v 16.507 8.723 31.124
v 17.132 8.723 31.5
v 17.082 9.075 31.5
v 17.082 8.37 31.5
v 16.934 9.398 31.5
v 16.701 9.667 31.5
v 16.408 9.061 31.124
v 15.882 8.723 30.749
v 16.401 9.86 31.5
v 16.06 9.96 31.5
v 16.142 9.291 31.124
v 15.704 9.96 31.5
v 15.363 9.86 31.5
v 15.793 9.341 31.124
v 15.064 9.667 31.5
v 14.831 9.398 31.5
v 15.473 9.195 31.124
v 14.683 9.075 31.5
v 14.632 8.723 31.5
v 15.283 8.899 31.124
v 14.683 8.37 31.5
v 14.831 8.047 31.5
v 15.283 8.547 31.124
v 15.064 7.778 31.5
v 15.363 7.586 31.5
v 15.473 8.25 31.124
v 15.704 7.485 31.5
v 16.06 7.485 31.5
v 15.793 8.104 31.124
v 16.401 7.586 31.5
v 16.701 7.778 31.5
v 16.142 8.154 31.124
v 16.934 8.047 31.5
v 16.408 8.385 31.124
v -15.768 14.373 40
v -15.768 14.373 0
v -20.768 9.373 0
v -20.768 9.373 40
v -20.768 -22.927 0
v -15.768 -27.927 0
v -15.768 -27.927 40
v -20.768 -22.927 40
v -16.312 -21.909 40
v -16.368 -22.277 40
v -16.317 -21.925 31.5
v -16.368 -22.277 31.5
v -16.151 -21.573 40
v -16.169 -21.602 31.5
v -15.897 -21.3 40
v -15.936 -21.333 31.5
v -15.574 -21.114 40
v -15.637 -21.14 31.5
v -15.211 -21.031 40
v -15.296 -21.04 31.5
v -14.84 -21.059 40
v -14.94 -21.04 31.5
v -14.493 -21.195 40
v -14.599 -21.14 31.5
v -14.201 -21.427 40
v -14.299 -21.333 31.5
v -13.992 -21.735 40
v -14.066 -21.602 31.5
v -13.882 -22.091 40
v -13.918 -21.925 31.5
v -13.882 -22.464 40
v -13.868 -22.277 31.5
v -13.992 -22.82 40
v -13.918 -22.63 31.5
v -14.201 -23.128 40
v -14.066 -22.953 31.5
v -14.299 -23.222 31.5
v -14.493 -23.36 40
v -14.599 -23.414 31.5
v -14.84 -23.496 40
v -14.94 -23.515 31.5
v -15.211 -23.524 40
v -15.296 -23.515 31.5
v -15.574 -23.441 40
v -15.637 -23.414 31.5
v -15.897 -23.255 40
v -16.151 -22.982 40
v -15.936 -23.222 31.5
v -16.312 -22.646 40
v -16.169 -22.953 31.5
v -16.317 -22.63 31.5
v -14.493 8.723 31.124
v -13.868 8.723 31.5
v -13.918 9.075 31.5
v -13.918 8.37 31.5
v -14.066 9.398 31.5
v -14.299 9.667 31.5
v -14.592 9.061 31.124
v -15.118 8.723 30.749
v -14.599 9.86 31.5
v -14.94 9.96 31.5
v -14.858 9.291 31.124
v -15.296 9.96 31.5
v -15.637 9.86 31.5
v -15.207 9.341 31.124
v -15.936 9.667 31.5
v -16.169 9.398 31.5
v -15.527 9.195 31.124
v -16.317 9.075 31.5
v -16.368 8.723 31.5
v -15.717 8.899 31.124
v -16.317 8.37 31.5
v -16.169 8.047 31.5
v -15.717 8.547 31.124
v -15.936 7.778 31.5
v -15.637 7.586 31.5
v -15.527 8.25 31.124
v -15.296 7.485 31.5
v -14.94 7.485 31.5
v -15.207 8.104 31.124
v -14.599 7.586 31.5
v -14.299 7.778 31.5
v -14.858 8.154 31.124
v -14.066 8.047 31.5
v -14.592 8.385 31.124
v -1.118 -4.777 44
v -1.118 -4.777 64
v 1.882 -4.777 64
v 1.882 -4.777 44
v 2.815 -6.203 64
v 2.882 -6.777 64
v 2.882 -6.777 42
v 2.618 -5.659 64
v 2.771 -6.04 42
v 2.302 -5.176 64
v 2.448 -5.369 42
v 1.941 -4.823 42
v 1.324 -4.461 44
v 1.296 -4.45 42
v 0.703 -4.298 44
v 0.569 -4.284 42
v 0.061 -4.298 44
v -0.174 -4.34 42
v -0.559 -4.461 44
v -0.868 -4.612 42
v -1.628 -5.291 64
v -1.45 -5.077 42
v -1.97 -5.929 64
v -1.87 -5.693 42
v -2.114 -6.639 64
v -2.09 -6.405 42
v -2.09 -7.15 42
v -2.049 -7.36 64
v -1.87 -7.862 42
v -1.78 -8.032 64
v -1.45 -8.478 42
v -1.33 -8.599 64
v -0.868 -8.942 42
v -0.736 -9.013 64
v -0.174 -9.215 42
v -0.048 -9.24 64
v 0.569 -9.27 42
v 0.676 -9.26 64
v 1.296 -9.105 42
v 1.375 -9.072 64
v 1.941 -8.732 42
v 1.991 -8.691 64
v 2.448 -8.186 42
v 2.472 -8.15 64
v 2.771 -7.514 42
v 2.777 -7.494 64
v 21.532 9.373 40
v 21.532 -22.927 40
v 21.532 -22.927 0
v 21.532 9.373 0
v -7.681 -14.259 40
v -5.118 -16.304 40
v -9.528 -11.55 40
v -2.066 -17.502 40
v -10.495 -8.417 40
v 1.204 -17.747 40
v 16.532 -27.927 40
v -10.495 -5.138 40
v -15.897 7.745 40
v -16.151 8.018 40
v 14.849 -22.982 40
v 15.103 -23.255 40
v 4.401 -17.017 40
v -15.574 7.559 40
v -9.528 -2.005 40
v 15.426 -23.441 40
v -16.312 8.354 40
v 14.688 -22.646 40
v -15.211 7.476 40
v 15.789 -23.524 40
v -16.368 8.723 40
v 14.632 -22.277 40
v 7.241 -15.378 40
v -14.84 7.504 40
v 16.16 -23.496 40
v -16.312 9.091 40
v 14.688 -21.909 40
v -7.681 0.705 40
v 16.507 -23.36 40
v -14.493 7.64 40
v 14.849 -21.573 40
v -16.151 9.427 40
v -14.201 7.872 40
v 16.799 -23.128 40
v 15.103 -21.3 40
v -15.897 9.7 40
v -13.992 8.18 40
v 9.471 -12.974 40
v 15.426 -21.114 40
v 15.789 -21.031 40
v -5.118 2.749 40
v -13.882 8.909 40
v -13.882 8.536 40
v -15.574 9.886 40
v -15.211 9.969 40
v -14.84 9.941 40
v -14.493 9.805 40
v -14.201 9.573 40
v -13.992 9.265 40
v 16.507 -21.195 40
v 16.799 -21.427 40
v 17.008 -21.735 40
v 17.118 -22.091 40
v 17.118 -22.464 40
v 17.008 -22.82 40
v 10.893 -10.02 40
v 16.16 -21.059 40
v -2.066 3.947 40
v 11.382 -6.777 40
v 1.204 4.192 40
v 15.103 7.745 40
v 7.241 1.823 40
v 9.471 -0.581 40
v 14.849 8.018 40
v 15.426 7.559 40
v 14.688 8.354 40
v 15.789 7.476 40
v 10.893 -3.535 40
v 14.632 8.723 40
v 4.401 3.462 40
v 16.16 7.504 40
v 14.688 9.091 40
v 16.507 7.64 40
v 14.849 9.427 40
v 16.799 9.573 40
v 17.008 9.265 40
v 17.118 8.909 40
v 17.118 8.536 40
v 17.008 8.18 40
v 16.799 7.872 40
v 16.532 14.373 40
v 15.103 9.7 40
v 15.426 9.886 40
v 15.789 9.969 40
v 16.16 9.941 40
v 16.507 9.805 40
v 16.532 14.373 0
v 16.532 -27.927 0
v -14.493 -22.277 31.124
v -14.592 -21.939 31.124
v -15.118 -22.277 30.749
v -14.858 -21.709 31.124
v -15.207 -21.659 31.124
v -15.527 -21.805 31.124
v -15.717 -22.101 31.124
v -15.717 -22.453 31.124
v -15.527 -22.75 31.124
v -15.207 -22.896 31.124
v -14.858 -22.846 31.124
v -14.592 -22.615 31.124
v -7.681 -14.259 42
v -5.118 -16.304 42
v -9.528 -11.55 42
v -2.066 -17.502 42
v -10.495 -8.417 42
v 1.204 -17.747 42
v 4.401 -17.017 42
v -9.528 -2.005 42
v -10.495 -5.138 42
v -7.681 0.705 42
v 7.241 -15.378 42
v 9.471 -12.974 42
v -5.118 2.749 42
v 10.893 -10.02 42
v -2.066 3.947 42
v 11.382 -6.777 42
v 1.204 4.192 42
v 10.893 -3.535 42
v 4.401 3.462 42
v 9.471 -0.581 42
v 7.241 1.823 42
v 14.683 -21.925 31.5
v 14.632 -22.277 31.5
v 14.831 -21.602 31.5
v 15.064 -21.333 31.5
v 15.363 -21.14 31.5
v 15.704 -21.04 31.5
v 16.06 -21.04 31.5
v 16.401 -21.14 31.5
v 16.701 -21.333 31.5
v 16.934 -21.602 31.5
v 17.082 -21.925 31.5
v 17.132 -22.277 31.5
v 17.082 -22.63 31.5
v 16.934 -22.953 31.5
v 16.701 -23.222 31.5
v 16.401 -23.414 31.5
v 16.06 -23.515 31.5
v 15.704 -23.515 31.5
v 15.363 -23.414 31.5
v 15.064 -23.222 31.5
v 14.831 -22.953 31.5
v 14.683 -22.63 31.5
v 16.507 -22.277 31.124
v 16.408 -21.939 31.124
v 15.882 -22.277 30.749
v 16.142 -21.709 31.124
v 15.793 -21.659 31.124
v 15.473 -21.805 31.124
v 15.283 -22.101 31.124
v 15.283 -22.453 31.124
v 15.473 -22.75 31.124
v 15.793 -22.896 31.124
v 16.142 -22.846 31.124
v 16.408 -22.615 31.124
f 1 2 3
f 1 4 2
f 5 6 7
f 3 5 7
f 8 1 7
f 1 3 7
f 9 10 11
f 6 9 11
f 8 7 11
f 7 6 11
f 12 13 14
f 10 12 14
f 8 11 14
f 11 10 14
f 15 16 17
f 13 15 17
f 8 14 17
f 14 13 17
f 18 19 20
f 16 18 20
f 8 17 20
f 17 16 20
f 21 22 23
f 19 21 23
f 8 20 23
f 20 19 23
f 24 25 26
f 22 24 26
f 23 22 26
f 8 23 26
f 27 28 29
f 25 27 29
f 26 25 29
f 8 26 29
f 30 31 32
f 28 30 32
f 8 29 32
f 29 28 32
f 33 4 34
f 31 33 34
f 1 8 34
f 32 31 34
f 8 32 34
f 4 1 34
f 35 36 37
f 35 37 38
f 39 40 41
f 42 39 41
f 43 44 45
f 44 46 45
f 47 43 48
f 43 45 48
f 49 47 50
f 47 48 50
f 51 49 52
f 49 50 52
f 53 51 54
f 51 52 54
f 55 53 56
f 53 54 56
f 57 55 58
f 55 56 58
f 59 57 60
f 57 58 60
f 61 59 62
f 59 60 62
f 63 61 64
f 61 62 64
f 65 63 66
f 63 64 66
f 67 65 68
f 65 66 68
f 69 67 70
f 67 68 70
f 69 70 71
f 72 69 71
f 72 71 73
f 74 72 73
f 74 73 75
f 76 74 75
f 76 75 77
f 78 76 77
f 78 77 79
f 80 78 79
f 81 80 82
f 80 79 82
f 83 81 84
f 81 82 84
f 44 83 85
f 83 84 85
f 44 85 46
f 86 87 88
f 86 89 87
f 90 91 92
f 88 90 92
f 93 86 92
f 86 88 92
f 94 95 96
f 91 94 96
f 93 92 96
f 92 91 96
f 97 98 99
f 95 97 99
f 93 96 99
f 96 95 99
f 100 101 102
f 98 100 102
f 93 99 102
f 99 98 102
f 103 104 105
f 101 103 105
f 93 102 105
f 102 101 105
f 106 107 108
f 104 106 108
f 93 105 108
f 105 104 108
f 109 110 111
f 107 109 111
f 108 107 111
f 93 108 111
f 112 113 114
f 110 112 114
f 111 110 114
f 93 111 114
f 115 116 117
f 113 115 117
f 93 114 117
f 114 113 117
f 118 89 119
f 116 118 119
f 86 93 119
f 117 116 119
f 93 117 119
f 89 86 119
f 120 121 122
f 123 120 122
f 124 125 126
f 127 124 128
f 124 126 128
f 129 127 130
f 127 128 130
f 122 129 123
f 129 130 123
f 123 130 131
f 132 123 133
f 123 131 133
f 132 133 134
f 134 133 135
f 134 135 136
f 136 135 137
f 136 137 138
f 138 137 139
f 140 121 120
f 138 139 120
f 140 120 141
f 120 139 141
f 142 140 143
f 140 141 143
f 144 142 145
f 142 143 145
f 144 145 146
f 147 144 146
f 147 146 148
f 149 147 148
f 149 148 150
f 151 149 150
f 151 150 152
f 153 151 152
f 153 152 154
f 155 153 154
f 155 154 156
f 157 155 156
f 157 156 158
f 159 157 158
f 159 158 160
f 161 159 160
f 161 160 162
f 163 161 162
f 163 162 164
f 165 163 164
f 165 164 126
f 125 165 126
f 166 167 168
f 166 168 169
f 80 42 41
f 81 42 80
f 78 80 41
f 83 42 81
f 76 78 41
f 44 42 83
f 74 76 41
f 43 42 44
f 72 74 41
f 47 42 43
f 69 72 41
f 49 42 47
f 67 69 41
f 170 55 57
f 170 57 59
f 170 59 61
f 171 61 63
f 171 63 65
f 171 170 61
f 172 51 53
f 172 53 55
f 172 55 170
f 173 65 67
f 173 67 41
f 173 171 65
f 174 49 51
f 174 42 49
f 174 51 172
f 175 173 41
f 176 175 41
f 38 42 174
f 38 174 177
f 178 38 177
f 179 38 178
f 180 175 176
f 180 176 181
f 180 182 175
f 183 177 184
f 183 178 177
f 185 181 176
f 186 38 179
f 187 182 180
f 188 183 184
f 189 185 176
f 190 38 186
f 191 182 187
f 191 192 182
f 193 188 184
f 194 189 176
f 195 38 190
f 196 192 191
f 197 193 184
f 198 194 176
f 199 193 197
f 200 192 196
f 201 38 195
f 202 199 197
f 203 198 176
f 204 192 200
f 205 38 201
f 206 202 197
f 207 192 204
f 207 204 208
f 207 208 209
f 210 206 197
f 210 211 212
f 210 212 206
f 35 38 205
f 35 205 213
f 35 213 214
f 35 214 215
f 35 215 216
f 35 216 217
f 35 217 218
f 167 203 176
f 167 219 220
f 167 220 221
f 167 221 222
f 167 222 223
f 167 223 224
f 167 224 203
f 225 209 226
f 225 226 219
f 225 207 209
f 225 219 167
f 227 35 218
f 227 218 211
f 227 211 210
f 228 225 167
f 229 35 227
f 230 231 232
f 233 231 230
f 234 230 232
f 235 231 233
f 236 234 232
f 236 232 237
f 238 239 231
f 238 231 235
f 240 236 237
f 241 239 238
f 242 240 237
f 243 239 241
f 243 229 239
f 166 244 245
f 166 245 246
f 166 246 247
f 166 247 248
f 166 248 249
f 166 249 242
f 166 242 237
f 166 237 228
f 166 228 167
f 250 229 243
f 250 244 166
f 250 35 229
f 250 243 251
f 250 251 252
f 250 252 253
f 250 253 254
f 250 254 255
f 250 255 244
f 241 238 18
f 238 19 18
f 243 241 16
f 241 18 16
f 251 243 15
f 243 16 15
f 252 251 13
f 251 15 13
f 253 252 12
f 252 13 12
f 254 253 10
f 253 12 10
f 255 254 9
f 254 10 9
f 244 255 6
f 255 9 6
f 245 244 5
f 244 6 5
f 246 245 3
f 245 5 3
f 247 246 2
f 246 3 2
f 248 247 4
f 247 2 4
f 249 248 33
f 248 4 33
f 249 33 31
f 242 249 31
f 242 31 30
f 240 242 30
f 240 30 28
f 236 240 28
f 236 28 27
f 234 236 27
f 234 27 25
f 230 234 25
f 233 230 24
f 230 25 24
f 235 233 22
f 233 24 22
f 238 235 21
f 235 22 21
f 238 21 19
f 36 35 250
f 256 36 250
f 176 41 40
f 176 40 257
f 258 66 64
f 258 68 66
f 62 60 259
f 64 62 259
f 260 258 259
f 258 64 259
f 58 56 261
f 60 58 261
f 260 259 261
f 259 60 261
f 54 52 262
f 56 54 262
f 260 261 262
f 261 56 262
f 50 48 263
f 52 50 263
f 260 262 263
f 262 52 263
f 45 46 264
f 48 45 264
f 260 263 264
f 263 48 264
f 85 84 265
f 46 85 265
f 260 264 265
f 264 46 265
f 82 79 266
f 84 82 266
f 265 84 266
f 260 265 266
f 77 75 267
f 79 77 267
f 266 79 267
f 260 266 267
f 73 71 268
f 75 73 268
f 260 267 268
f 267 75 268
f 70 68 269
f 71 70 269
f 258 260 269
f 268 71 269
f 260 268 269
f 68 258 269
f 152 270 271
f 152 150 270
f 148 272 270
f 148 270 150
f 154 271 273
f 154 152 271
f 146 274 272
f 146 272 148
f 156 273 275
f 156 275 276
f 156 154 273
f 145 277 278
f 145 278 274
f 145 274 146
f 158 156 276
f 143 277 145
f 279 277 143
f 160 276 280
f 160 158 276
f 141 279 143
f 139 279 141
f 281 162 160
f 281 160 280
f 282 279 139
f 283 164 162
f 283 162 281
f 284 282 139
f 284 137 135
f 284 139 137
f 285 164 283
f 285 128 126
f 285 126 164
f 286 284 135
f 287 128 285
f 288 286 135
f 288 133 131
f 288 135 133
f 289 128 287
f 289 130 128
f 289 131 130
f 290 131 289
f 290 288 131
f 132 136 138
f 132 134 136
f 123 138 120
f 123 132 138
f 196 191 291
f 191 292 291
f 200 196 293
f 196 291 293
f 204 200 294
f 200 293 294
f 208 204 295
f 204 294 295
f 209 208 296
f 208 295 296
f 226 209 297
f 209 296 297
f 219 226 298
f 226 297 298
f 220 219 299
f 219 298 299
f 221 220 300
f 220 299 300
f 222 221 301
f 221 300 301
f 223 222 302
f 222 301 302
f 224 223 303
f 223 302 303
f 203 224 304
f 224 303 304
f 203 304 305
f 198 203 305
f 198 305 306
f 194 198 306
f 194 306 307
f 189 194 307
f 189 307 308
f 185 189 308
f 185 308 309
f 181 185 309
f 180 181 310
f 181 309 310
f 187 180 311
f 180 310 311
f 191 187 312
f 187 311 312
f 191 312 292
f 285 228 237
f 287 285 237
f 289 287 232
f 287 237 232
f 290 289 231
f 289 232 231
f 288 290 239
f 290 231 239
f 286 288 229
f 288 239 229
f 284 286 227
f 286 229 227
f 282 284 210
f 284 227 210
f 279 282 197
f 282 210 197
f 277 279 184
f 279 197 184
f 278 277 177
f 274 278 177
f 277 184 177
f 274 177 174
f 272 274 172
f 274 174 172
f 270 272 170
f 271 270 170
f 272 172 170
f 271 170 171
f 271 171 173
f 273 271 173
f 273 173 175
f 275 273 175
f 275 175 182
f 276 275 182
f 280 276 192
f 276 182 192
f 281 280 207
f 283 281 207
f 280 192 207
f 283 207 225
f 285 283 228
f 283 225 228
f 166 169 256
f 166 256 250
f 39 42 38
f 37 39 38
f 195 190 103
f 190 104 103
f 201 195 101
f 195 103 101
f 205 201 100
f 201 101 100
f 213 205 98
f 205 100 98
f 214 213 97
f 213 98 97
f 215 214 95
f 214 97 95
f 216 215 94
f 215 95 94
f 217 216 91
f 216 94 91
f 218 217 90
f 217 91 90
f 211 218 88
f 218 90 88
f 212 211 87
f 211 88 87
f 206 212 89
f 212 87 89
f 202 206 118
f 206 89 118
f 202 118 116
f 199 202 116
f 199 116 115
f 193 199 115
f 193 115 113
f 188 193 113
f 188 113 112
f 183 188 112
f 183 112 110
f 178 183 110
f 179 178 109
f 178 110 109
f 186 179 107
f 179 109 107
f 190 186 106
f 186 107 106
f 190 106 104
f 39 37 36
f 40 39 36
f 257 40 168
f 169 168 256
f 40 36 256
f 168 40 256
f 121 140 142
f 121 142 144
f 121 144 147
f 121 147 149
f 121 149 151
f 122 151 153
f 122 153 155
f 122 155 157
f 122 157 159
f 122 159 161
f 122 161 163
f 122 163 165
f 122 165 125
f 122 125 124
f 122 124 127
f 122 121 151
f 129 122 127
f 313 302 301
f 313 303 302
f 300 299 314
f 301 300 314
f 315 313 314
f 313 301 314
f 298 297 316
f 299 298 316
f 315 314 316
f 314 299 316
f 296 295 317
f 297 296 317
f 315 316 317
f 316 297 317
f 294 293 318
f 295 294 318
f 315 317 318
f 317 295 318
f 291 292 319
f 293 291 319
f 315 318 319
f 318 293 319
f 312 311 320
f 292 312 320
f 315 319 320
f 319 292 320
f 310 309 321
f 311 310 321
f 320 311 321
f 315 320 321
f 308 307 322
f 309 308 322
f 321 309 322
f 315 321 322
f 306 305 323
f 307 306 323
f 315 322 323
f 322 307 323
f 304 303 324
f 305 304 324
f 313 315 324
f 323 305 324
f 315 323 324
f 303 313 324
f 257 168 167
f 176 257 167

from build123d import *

# Parameters (mm, degrees)
SKIZZE1_W                       = 42.3
SKIZZE1_H                       = 42.3
AUFSATZ_LINEAR_AUSTRAGEN1_DEPTH = 40
SKIZZE2_R                       = 11
AUFSATZ_LINEAR_AUSTRAGEN2_DEPTH = 2
SKIZZE3_R                       = 2.5
AUFSATZ_LINEAR_AUSTRAGEN3_DEPTH = 22
SKIZZE4_W                       = 5
SKIZZE4_H                       = 0.5
SCHNITT_LINEAR_AUSTRAGEN1_DEPTH = 20
M3_GEWINDEBOHRUNG2_D            = 2.5
M3_GEWINDEBOHRUNG2_DEPTH        = 8.5
M3_GEWINDEBOHRUNG2_TIP          = 0.751075774
FASE6_SIZE                      = 5


with BuildPart() as part:
    # Skizze1 → Aufsatz-Linear austragen1 (new body)
    with BuildSketch(Plane.XY):
        with Locations((0.382196485, -6.777376721)):
            Rectangle(SKIZZE1_W, SKIZZE1_H)
    extrude(amount=AUFSATZ_LINEAR_AUSTRAGEN1_DEPTH)

    # Skizze2 → Aufsatz-Linear austragen2 (add)
    with BuildSketch(Plane.XY.offset(40)):
        with Locations((0.382196485, -6.777376721)):
            Circle(SKIZZE2_R)
    extrude(amount=AUFSATZ_LINEAR_AUSTRAGEN2_DEPTH)

    # Skizze3 → Aufsatz-Linear austragen3 (add)
    with BuildSketch(Plane.XY.offset(42)):
        with Locations((0.382196485, -6.777376721)):
            Circle(SKIZZE3_R)
    extrude(amount=AUFSATZ_LINEAR_AUSTRAGEN3_DEPTH)

    # Skizze4 → Schnitt-Linear austragen1 (cut)
    with BuildSketch(Plane.XY.offset(64)):
        with Locations((0.382196485, -4.527376721)):
            Rectangle(SKIZZE4_W, SKIZZE4_H)
    extrude(amount=-SCHNITT_LINEAR_AUSTRAGEN1_DEPTH, mode=Mode.SUBTRACT)

    # M3 Gewindebohrung2
    with Locations(Plane.XY.offset(40)):
        with Locations((-15.117803515, 8.722623279), (15.882196485, 8.722623279), (-15.117803515, -22.277376721), (15.882196485, -22.277376721)):
            Hole(M3_GEWINDEBOHRUNG2_D / 2, depth=M3_GEWINDEBOHRUNG2_DEPTH)
            with Locations((0, 0, -(M3_GEWINDEBOHRUNG2_DEPTH + M3_GEWINDEBOHRUNG2_TIP / 2))):  # 118° drill point
                Cone(0, M3_GEWINDEBOHRUNG2_D / 2, M3_GEWINDEBOHRUNG2_TIP, mode=Mode.SUBTRACT)

    # Fase6
    fase6_edges = [part.edges().sort_by_distance(p)[0] for p in [
        (-20.767803515, 14.372623279, 20),
        (21.532196485, 14.372623279, 20),
        (21.532196485, -27.927376721, 20),
        (-20.767803515, -27.927376721, 20),
    ]]
    chamfer(fase6_edges, length=FASE6_SIZE)


solid = part.part
